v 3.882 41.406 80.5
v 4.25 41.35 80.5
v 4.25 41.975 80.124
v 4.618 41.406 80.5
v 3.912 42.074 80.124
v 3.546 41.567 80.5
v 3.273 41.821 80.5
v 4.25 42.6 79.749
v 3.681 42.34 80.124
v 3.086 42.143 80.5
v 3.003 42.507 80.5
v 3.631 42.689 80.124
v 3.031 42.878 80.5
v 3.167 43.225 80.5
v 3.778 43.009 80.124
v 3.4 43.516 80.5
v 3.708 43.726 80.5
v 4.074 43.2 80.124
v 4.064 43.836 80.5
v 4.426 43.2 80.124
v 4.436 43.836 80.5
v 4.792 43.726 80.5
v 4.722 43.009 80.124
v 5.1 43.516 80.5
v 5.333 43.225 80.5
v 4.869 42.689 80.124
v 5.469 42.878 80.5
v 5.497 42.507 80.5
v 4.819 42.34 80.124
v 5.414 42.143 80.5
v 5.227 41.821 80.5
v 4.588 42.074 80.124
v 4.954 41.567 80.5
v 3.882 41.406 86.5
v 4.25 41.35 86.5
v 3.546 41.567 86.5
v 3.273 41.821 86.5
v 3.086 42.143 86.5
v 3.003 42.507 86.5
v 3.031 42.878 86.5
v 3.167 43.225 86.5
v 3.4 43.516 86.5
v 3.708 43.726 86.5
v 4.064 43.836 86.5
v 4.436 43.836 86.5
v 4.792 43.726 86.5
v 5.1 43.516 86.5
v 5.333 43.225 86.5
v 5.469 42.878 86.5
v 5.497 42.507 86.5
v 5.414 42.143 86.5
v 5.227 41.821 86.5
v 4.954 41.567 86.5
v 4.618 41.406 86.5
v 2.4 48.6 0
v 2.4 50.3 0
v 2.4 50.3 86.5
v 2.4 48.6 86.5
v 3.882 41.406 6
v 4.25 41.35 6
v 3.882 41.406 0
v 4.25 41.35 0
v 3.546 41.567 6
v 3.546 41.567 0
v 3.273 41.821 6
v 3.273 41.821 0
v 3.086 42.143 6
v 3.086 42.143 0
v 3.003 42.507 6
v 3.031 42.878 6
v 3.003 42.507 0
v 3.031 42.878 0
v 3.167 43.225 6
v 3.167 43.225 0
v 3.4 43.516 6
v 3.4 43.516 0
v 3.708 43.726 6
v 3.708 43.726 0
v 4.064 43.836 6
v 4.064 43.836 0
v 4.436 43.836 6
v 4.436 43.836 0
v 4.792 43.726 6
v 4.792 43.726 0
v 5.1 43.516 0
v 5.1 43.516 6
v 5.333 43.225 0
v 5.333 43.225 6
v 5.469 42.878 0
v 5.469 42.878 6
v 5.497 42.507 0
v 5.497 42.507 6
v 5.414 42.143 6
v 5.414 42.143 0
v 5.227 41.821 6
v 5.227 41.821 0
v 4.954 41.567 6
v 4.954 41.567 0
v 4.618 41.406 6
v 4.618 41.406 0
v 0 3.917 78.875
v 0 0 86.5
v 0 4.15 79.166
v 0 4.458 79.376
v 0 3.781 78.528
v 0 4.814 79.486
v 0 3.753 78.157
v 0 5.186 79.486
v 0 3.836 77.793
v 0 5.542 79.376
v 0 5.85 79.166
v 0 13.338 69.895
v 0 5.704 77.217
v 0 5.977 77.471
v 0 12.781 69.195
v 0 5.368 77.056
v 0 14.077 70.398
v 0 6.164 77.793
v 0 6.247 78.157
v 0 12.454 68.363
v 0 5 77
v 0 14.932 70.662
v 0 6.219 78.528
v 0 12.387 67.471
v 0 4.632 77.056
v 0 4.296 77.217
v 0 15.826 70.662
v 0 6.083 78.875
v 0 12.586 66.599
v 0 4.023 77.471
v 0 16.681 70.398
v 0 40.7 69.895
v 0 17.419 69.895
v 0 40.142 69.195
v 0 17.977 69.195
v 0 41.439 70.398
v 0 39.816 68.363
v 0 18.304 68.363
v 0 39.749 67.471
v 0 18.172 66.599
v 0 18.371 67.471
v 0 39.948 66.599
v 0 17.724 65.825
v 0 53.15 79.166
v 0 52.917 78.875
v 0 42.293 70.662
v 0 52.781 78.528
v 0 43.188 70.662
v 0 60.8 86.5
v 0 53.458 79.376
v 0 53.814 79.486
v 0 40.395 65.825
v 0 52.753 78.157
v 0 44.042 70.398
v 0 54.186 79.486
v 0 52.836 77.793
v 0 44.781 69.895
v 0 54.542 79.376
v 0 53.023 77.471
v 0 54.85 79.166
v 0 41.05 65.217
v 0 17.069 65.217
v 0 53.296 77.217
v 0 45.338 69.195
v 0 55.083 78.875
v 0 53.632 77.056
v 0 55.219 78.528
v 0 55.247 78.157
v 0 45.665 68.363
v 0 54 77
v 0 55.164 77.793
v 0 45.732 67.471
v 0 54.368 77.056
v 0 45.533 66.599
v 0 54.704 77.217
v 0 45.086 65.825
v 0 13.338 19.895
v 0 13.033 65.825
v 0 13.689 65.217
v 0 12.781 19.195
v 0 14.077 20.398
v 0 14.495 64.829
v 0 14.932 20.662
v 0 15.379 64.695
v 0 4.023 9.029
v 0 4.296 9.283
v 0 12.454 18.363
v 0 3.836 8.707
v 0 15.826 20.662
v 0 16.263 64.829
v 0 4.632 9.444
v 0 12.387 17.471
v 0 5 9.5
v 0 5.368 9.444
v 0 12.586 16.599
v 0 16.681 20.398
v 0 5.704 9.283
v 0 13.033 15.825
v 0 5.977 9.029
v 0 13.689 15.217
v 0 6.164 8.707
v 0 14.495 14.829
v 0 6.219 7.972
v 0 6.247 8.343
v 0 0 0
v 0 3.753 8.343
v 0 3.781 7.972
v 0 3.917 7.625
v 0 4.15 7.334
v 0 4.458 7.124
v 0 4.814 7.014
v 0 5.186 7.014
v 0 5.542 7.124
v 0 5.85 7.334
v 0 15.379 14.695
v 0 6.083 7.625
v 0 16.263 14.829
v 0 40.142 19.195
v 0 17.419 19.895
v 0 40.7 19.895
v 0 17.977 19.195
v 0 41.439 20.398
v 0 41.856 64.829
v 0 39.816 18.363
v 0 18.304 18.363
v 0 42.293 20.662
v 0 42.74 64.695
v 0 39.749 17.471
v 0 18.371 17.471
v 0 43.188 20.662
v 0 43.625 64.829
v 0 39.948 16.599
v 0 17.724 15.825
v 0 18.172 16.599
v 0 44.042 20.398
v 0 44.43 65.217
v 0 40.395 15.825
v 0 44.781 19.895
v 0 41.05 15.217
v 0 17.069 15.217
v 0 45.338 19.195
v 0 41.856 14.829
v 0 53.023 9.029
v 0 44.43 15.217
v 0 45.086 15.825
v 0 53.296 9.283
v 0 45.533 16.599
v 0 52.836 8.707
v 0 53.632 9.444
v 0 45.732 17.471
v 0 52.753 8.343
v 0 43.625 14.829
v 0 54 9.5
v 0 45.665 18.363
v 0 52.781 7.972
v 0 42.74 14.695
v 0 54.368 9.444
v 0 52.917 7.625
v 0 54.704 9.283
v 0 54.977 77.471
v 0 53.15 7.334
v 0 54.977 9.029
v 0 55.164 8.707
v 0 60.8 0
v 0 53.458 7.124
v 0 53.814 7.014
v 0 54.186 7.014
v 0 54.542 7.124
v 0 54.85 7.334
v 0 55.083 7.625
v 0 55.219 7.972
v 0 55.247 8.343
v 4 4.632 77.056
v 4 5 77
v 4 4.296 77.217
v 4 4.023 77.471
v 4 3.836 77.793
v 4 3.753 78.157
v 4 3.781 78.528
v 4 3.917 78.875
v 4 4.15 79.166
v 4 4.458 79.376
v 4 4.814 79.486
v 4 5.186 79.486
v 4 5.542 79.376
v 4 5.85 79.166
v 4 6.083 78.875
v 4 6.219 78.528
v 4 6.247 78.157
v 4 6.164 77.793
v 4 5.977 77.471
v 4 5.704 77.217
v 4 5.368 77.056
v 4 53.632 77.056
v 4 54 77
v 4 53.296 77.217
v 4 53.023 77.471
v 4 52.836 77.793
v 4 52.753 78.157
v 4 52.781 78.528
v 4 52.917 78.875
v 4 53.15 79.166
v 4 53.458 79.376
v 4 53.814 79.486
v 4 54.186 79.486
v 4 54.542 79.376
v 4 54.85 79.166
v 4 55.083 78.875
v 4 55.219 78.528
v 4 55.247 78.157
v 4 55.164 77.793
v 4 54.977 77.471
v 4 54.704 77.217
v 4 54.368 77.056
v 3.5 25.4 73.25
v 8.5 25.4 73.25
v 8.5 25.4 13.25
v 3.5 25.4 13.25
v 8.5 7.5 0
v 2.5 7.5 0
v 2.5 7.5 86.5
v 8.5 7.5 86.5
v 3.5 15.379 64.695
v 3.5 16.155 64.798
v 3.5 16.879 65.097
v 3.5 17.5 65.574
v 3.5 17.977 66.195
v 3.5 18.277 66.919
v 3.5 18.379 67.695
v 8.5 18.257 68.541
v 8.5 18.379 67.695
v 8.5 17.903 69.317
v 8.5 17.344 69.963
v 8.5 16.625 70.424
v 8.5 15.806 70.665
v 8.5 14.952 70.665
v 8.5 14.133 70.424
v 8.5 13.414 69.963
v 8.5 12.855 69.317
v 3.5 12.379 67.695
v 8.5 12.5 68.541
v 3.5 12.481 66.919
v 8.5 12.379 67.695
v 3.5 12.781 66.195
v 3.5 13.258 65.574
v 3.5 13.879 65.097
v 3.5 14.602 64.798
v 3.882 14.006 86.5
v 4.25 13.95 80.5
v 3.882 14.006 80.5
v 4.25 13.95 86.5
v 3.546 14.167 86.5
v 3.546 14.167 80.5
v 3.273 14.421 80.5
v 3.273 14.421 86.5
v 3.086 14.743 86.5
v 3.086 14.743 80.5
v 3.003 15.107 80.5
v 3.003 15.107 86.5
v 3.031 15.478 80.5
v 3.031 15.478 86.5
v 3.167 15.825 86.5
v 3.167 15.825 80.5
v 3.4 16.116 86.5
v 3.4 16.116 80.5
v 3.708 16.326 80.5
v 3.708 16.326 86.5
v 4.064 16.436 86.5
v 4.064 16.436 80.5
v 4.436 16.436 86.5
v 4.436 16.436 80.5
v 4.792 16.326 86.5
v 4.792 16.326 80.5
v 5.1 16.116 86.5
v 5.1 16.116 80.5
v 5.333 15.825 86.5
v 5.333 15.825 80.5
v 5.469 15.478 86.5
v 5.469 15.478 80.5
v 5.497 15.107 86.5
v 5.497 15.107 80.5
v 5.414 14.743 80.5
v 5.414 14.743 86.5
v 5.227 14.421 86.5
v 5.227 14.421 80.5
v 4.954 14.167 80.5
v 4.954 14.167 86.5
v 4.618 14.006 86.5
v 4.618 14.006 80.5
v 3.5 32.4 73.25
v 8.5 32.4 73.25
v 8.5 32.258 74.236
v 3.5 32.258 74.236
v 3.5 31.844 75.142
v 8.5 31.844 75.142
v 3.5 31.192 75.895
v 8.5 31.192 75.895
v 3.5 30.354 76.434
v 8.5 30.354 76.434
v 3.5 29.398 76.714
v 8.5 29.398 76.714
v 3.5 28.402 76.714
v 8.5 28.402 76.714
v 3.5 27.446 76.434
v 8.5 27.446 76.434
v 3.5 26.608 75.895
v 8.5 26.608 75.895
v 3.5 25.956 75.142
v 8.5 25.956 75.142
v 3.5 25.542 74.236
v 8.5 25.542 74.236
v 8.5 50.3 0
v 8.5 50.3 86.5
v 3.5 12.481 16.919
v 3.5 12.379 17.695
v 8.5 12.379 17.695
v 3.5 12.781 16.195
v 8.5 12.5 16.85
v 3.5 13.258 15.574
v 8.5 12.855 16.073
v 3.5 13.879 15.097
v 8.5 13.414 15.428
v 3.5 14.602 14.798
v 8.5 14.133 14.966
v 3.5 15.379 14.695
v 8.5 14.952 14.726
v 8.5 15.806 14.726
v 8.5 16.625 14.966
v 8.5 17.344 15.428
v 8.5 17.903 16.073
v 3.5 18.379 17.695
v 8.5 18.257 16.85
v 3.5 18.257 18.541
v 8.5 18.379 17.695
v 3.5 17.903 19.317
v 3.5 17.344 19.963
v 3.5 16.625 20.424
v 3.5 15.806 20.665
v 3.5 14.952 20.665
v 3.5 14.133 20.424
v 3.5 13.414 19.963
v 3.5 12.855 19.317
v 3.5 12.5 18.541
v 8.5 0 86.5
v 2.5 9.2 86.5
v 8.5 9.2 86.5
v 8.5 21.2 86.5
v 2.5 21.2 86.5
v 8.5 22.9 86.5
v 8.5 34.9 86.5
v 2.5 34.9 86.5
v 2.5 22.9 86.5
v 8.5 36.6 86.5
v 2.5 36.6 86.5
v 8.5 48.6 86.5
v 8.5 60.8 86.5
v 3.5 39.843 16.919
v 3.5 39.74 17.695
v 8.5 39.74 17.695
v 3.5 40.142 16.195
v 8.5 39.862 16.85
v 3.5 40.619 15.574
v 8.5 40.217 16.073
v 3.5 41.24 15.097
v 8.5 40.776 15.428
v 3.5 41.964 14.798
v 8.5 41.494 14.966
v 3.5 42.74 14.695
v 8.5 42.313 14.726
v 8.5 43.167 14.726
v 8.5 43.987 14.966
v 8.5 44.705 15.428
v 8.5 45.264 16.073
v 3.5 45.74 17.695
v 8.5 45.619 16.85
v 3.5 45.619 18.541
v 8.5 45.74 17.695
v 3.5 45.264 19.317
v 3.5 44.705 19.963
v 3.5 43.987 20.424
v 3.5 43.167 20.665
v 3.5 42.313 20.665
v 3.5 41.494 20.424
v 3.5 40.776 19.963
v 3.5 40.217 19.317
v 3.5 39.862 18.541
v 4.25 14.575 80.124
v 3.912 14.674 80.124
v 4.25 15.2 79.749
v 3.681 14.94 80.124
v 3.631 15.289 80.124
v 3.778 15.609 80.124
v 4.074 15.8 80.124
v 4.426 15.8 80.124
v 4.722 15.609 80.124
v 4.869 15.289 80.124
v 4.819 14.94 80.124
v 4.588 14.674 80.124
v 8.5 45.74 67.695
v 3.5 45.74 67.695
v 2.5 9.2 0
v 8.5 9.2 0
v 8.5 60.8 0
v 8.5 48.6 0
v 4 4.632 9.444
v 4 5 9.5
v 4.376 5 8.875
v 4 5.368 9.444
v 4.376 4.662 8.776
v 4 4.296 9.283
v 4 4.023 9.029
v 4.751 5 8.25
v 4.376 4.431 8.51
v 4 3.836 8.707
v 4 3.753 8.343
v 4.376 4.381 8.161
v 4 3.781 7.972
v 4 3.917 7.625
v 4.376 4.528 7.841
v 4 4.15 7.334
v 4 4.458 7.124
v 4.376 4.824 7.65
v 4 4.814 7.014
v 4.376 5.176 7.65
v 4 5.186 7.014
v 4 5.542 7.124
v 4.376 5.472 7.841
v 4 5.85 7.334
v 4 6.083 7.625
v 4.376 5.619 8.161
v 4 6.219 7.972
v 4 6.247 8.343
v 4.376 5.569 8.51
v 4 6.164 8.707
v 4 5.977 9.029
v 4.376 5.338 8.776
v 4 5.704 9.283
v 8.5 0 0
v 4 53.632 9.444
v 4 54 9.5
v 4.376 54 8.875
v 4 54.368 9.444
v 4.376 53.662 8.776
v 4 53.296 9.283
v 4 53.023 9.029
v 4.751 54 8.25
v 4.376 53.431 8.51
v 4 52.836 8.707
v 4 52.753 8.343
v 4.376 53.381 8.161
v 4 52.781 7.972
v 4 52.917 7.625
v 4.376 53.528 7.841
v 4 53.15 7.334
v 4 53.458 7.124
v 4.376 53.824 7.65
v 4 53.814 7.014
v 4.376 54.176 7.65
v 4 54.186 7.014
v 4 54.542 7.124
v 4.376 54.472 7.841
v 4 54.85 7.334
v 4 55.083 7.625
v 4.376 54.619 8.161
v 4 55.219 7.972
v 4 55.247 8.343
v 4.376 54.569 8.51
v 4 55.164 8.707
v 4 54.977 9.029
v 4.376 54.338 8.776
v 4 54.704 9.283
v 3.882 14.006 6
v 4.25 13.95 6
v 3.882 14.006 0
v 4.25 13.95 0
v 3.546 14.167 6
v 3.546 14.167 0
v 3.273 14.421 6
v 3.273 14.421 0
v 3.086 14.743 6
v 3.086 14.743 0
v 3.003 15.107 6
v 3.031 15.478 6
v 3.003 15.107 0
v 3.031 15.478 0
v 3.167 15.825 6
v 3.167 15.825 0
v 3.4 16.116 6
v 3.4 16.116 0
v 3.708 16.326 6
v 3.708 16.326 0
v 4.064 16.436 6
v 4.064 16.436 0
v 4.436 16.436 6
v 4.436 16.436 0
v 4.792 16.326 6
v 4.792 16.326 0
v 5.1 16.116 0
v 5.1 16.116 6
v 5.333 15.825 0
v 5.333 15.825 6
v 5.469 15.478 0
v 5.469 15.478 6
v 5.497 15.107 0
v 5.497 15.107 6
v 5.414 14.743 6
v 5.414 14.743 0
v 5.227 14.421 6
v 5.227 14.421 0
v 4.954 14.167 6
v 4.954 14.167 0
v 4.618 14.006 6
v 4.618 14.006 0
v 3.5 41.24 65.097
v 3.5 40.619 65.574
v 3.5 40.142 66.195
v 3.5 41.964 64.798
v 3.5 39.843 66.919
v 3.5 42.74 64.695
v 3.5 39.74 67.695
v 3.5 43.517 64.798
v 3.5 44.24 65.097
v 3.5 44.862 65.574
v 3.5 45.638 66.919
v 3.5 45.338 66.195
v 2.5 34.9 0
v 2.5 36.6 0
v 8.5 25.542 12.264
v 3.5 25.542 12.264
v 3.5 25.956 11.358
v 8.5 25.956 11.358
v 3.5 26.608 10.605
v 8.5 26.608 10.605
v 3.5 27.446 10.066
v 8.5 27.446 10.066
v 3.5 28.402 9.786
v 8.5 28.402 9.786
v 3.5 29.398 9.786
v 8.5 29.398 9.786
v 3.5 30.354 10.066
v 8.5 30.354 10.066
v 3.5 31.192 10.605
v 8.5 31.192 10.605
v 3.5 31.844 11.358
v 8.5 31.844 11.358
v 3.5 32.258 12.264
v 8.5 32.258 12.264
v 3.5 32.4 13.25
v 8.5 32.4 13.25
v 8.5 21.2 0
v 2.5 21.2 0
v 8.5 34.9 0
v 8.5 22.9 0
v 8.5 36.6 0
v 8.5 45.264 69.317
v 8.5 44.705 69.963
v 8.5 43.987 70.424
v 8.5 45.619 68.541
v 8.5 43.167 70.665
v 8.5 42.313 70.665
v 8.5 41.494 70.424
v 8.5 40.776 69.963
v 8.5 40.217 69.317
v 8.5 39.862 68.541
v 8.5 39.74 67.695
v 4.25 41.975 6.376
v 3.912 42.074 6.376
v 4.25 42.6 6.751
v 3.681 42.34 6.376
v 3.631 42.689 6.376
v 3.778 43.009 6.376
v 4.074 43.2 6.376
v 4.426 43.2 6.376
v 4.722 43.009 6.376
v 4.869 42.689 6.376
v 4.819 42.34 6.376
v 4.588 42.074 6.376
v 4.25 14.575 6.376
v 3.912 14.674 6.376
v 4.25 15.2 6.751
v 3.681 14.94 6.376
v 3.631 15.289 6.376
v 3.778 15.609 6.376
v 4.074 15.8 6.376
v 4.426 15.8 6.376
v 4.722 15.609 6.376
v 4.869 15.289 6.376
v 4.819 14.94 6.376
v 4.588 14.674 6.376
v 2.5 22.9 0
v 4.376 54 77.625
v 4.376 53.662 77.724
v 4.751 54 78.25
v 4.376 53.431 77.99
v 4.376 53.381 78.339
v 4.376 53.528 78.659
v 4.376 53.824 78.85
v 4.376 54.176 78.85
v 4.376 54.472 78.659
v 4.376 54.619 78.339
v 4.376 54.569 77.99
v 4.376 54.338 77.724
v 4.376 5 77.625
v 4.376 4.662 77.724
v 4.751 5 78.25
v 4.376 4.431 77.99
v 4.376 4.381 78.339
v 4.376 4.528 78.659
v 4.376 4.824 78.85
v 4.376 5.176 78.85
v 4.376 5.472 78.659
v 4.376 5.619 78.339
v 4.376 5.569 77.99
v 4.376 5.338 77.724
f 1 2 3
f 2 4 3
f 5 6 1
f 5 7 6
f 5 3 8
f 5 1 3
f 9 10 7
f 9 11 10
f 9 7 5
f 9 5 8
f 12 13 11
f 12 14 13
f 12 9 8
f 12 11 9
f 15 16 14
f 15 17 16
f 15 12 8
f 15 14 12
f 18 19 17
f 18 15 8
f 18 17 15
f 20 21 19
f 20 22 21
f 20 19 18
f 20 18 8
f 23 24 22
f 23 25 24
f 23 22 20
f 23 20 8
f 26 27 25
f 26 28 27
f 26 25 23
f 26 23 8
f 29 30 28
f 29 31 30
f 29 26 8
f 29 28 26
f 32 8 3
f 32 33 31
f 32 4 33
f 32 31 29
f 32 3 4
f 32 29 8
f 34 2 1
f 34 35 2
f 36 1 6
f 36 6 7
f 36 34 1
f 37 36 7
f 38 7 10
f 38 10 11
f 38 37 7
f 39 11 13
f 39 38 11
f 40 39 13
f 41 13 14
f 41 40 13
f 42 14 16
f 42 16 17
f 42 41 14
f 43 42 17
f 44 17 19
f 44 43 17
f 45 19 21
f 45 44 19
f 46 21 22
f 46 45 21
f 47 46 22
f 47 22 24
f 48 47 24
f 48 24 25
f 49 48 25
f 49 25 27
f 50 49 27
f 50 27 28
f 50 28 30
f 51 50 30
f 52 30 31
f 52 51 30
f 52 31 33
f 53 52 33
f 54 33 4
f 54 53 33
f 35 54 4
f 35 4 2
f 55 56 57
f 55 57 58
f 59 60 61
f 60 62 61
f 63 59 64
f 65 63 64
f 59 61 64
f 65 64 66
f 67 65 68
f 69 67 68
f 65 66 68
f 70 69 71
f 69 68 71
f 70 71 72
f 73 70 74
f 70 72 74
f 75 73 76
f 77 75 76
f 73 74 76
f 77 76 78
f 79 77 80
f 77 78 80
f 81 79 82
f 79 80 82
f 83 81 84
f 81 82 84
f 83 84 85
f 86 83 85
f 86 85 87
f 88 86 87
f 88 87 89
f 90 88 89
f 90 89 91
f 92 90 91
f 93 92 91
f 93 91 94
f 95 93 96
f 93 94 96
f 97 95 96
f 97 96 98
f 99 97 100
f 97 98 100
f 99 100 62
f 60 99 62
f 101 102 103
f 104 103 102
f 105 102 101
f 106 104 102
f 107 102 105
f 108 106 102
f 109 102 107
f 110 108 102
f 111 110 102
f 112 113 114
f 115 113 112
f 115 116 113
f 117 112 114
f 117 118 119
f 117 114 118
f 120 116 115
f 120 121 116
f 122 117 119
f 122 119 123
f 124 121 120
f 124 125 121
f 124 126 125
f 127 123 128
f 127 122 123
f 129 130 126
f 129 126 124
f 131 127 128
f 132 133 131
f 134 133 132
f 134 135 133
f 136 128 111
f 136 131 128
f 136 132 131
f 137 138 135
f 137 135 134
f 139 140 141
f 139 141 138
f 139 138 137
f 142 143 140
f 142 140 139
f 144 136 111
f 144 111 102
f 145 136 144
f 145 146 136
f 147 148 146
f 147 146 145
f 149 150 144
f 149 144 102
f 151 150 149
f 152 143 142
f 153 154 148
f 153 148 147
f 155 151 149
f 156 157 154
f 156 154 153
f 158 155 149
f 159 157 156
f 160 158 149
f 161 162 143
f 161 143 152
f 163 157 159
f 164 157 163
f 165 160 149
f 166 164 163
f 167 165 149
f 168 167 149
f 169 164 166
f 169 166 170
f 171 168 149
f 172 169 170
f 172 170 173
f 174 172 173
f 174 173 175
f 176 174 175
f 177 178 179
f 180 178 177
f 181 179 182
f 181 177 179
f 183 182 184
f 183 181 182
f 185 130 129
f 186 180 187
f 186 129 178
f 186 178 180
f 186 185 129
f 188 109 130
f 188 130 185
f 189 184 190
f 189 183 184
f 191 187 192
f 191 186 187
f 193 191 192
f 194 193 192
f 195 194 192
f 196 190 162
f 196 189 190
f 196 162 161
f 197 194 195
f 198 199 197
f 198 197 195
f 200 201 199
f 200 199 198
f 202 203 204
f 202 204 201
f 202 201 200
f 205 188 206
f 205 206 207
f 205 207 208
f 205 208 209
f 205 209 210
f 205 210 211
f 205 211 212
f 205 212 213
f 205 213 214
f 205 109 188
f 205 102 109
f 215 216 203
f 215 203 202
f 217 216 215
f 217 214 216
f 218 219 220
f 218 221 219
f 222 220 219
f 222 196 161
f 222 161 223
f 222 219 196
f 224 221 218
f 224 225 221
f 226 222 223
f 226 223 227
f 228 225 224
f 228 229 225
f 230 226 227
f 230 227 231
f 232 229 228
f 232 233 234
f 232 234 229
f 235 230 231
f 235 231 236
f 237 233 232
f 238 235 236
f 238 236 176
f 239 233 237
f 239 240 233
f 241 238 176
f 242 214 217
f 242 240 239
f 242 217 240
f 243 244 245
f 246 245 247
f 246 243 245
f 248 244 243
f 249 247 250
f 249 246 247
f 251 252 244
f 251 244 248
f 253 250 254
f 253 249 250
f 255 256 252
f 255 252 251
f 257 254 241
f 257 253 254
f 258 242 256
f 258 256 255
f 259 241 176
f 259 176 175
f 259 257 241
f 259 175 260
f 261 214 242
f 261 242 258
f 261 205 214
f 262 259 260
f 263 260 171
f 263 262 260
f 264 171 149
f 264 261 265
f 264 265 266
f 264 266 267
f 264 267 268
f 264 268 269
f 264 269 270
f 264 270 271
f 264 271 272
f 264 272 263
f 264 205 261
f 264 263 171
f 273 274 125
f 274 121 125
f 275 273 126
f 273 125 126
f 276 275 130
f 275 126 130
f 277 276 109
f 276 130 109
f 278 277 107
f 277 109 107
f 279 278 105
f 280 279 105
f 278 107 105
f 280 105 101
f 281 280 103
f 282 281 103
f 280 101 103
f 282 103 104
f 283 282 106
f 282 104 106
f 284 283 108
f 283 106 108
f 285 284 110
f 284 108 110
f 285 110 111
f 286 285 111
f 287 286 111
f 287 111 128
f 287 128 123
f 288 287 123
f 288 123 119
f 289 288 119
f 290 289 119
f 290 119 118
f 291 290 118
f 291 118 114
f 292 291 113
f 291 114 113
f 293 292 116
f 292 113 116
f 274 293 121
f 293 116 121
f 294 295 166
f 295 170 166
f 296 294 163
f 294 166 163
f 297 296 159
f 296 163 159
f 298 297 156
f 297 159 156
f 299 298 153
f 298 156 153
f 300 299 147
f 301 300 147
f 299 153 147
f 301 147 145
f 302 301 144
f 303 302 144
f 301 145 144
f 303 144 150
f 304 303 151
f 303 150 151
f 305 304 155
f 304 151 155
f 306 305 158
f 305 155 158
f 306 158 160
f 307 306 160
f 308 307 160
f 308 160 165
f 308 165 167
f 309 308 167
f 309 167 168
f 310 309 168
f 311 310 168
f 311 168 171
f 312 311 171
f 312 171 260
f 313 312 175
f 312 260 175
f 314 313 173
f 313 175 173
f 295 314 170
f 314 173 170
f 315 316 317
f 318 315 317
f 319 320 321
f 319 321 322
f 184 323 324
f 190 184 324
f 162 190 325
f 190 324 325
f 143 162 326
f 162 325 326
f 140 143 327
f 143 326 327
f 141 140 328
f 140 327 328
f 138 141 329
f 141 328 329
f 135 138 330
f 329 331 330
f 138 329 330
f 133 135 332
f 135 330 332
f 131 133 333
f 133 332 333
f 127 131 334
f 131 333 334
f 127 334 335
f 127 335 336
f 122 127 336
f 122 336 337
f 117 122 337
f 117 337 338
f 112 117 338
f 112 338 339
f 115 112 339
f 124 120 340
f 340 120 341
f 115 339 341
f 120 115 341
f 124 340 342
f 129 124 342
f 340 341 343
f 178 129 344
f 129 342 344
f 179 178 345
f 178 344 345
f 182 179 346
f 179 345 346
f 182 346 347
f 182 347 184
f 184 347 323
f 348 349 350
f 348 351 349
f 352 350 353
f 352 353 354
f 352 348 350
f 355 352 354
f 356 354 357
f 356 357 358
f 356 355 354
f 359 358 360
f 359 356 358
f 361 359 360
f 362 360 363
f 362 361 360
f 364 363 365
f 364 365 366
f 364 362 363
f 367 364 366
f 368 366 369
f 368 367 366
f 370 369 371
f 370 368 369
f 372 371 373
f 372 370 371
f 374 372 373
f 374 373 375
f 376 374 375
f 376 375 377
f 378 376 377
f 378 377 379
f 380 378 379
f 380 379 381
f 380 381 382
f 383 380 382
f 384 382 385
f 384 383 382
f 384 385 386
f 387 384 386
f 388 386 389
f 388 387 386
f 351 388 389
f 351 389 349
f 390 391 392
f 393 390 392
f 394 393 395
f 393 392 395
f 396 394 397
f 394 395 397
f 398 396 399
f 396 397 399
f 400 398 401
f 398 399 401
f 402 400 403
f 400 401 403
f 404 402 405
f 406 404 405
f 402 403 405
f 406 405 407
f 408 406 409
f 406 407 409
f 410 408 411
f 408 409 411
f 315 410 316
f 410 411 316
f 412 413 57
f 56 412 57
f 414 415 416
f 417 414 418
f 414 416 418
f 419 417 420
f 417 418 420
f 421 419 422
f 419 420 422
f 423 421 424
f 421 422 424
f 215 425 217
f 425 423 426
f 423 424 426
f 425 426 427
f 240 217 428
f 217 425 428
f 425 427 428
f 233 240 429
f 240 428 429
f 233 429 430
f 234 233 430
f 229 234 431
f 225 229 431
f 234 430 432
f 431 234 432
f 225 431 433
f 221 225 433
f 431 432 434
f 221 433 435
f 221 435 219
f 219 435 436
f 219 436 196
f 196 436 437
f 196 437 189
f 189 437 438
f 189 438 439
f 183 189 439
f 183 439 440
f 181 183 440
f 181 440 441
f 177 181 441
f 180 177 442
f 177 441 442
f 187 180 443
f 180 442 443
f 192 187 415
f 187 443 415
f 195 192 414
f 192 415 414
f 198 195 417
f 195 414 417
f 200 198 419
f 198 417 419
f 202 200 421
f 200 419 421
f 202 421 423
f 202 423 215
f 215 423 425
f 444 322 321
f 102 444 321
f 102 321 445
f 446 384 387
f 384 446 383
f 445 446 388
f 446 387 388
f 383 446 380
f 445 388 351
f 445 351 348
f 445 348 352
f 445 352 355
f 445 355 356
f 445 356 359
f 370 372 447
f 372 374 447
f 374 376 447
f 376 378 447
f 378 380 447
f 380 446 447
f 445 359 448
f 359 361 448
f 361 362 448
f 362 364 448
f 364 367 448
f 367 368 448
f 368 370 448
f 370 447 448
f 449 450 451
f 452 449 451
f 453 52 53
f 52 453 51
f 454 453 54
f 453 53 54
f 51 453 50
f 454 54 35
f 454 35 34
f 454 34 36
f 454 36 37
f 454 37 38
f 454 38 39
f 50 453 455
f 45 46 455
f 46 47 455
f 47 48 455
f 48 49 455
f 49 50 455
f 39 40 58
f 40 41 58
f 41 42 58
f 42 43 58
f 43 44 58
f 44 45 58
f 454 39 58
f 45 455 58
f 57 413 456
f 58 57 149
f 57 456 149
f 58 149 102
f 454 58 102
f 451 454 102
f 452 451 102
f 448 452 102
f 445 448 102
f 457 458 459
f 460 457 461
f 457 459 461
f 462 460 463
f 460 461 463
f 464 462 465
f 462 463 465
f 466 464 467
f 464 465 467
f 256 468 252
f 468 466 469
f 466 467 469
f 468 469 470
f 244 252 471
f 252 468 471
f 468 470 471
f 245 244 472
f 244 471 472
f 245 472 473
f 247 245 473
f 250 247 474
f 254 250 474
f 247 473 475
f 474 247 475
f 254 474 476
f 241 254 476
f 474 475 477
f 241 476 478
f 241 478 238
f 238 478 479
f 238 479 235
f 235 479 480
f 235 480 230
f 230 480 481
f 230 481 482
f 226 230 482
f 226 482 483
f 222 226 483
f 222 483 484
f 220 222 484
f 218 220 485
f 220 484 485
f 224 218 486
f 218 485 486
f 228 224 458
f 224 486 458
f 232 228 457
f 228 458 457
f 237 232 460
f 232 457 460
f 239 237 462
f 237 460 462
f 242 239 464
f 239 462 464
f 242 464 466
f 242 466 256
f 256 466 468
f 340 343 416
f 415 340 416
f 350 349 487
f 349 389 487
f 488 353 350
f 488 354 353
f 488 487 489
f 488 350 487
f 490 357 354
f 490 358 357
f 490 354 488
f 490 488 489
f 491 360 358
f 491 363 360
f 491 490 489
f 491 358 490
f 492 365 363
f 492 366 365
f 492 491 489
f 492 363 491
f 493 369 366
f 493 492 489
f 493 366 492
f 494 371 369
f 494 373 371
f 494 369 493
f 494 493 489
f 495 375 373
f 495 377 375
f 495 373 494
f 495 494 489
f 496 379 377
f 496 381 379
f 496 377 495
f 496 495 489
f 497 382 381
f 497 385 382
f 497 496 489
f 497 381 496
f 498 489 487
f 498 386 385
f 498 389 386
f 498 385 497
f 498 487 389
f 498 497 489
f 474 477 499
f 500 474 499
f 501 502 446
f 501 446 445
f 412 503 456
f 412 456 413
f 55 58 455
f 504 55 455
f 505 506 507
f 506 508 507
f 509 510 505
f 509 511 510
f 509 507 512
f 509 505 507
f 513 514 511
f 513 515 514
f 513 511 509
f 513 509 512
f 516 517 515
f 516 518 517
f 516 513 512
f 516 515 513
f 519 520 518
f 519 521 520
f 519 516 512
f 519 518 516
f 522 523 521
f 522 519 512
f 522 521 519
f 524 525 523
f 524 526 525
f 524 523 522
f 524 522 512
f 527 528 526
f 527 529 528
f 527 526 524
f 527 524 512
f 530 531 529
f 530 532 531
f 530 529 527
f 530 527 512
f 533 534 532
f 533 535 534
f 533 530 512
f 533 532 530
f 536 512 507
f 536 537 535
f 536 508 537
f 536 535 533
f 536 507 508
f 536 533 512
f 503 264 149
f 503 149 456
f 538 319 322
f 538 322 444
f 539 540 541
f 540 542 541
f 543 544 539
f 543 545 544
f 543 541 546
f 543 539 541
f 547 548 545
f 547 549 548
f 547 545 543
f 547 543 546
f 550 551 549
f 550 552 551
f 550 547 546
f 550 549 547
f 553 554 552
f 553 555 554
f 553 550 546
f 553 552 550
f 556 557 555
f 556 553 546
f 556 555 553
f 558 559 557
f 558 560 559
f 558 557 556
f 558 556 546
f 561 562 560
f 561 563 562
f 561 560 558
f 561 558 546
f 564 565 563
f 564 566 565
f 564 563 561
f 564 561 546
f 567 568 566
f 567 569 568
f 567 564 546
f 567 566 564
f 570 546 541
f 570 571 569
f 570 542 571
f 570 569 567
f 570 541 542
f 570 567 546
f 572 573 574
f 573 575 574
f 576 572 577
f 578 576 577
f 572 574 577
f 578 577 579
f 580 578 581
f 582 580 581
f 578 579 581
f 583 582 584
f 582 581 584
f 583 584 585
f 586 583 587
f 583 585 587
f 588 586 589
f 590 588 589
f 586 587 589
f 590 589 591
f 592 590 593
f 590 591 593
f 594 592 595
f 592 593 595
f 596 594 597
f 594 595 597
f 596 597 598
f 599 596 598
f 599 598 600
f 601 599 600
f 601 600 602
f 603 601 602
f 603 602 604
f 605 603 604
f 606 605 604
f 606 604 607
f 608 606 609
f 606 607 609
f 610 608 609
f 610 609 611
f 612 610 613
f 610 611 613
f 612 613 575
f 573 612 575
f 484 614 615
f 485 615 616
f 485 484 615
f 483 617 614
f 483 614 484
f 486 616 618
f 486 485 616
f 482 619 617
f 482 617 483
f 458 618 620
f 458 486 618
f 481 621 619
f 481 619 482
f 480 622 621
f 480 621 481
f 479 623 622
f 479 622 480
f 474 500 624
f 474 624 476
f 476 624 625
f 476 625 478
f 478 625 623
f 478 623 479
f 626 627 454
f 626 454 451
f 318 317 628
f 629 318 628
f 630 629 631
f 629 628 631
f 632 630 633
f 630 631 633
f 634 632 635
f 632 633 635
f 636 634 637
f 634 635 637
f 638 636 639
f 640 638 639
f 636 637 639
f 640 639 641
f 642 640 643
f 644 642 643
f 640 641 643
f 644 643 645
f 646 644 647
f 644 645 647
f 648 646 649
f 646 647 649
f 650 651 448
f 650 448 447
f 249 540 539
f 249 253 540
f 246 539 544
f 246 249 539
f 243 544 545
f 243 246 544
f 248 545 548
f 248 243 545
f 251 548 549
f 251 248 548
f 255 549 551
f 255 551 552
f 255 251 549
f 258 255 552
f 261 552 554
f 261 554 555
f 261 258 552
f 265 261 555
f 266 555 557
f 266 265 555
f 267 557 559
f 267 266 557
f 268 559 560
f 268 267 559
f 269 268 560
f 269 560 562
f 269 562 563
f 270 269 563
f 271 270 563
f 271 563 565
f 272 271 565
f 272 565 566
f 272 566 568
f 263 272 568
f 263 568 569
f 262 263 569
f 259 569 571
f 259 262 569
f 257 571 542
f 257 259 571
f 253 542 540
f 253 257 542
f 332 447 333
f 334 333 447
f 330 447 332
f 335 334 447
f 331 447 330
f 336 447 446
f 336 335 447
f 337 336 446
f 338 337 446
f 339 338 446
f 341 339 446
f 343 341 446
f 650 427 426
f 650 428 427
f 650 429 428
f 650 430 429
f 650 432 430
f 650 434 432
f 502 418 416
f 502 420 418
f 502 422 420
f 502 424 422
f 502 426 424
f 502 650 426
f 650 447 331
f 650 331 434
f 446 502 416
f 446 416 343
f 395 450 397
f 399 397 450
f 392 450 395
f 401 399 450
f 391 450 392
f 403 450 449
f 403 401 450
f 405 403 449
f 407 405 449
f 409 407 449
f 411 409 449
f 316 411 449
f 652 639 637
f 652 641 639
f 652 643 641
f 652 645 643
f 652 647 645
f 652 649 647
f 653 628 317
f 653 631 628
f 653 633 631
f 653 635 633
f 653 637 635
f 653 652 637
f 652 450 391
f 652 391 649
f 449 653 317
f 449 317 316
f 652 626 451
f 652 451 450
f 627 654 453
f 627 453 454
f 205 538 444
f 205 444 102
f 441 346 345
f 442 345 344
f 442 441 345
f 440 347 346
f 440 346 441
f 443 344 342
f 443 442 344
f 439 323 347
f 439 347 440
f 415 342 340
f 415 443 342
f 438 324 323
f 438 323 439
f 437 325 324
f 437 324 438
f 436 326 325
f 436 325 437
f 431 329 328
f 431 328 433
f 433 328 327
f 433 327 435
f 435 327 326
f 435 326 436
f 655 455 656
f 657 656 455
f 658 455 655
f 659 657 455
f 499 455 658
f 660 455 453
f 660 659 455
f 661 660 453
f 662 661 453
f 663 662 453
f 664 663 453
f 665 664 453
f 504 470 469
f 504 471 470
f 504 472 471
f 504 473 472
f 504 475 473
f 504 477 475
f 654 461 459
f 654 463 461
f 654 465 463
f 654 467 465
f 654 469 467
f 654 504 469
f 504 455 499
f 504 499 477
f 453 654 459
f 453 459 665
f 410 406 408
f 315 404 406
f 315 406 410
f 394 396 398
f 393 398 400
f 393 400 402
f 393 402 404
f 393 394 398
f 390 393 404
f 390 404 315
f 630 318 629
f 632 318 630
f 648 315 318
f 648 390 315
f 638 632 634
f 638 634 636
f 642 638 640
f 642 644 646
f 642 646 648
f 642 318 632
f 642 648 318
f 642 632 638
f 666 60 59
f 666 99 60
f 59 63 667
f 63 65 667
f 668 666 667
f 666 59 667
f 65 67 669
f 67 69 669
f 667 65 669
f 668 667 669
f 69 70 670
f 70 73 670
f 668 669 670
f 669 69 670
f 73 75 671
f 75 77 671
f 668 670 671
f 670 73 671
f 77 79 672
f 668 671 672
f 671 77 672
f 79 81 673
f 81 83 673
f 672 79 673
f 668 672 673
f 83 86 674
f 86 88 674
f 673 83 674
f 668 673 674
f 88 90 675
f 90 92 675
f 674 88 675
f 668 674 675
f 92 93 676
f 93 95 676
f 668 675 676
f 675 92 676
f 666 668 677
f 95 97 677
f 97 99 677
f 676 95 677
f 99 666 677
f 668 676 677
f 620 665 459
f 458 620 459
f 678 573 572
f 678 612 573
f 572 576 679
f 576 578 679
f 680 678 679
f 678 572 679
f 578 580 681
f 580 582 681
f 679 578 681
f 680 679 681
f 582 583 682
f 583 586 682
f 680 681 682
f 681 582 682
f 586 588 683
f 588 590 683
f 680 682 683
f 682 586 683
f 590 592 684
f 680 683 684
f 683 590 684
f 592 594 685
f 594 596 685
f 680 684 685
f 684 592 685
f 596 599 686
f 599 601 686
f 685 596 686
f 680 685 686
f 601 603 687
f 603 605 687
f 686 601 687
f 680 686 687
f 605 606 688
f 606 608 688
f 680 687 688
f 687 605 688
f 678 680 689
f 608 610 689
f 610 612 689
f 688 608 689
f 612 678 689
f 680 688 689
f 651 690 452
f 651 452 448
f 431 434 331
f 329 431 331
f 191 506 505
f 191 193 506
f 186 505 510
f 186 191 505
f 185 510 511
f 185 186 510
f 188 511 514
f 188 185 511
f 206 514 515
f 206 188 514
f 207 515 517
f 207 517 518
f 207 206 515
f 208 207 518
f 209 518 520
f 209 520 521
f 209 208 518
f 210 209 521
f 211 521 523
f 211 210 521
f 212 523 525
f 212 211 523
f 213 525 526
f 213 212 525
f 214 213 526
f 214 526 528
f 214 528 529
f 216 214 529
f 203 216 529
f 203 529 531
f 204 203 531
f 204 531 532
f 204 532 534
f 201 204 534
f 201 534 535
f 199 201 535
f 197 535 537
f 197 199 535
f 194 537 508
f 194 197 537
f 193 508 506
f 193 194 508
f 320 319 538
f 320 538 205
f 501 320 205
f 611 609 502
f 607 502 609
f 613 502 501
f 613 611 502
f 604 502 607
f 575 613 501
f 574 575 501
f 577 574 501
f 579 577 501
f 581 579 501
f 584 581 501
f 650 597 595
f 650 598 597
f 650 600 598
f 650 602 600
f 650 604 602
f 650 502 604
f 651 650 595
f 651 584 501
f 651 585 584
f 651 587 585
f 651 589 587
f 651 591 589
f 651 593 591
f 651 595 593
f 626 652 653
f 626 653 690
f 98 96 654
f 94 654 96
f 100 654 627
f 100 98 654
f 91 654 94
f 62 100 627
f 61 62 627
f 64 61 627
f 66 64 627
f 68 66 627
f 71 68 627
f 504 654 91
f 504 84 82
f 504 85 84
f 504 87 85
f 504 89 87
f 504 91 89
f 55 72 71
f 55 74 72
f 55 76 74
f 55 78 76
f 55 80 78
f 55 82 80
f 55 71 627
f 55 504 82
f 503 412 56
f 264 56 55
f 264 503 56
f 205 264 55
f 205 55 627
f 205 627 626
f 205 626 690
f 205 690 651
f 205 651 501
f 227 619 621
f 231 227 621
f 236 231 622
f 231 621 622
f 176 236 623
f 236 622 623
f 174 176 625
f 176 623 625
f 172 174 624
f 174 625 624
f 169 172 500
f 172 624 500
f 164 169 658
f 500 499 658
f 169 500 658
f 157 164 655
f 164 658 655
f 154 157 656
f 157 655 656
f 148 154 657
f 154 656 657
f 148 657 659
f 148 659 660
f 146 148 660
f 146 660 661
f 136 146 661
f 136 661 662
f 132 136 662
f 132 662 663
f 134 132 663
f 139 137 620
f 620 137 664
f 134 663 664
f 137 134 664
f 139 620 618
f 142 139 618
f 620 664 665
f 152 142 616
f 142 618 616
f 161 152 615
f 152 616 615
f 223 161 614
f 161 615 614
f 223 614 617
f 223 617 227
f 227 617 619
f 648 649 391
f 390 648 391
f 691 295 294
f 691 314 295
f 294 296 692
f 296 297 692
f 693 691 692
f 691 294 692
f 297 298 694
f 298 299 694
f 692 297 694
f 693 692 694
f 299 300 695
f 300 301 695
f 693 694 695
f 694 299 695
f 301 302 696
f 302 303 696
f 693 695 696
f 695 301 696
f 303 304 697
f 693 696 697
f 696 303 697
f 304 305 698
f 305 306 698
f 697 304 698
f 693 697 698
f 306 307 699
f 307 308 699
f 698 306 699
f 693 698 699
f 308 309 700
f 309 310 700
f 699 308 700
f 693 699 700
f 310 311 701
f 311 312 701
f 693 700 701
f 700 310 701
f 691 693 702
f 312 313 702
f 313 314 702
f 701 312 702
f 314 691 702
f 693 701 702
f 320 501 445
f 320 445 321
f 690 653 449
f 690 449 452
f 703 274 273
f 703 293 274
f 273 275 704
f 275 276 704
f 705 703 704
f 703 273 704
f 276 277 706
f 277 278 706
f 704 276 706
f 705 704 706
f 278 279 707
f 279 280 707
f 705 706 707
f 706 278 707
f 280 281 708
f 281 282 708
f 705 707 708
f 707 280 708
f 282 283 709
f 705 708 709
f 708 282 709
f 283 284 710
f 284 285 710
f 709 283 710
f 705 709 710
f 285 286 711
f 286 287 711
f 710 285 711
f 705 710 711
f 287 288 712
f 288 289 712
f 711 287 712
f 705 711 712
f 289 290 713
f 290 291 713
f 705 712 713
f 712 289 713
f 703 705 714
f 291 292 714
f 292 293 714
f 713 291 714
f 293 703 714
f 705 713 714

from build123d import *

# Parameters (mm, degrees)
BOSS_EXTRUDE1_DEPTH            = 86.5
M3X0_5_TAPPED_HOLE2_AT_2_COUNT = 2
M3X0_5_TAPPED_HOLE2_AT_2_PITCH = 27.4
M3X0_5_TAPPED_HOLE1_AT_2_COUNT = 2
M3X0_5_TAPPED_HOLE1_AT_2_PITCH = 49
SKETCH14_R                     = 3.5
CUT_EXTRUDE3_DEPTH             = 5
CUT_EXTRUDE1_DEPTH             = 5
SKETCH13_R                     = 3
CUT_EXTRUDE2_DEPTH             = 4.5


with BuildPart() as part:
    # Sketch1 → Boss-Extrude1 (new body)
    with BuildSketch(Plane.XY):
        Polygon((0, 0), (0, 60.8), (8.5, 60.8), (8.5, 50.3), (2.4, 50.3), (2.4, 48.6), (8.5, 48.6), (8.5, 36.6), (2.5, 36.6), (2.5, 34.9), (8.5, 34.9), (8.5, 22.9), (2.5, 22.9), (2.5, 21.2), (8.5, 21.2), (8.5, 9.2), (2.5, 9.2), (2.5, 7.5), (8.5, 7.5), (8.5, 0), align=None)
    extrude(amount=BOSS_EXTRUDE1_DEPTH)

    # Sketch4 → M3x0.5 Tapped Hole2 (revolve, cut)
    with BuildSketch(Plane(origin=(4.25, 42.6, 86.5), x_dir=(0, -1, 0), z_dir=(1, 0, 0))):
        Polygon((0, 0), (0, 6.751075774), (1.25, 6), (1.25, 0), align=None)
    m3x0_5_tapped_hole2 = revolve(axis=Axis((4.25, 42.6, 92.85), (0, 0, -1)), mode=Mode.SUBTRACT)

    # M3x0.5 Tapped Hole2 at 2: M3x0.5 Tapped Hole2 ×2
    with Locations(*[(0, -i * M3X0_5_TAPPED_HOLE2_AT_2_PITCH, 0) for i in range(1, M3X0_5_TAPPED_HOLE2_AT_2_COUNT)]):
        add(m3x0_5_tapped_hole2, mode=Mode.SUBTRACT)

    # Mirror1: M3x0.5 Tapped Hole2 across plane
    add(m3x0_5_tapped_hole2.mirror(Plane.XY.offset(43.25)), mode=Mode.SUBTRACT)

    # Mirror1 copy 1 sketch → Mirror1 copy 1 (revolve, cut)
    with BuildSketch(Plane(origin=(4.25, 15.2, 0), x_dir=(0, -1, 0), z_dir=(1, 0, 0))):
        Polygon((0, 0), (0, -6.751075774), (1.25, -6), (1.25, 0), align=None)
    revolve(axis=Axis((4.25, 15.2, -6.35), (0, 0, -1)), mode=Mode.SUBTRACT)

    # Sketch11 → M3x0.5 Tapped Hole1 (revolve, cut)
    with BuildSketch(Plane(origin=(0, 5, 8.25), x_dir=(0, 0, 1), z_dir=(0, 1, 0))):
        Polygon((0, 0), (0, 4.751075774), (1.25, 4), (1.25, 0), align=None)
    m3x0_5_tapped_hole1 = revolve(axis=Axis((-6.35, 5, 8.25), (1, 0, 0)), mode=Mode.SUBTRACT)

    # M3x0.5 Tapped Hole1 at 2: M3x0.5 Tapped Hole1 ×2
    with Locations(*[(0, i * M3X0_5_TAPPED_HOLE1_AT_2_PITCH, 0) for i in range(1, M3X0_5_TAPPED_HOLE1_AT_2_COUNT)]):
        add(m3x0_5_tapped_hole1, mode=Mode.SUBTRACT)

    # Mirror2: M3x0.5 Tapped Hole1 across plane
    add(m3x0_5_tapped_hole1.mirror(Plane(origin=(0, 0, 43.25), x_dir=(1, 0, 0), z_dir=(0, 0, -1))), mode=Mode.SUBTRACT)

    # Mirror2 copy 1 sketch → Mirror2 copy 1 (revolve, cut)
    with BuildSketch(Plane(origin=(0, 54, 78.25), x_dir=(0, 0, -1), z_dir=(0, 1, 0))):
        Polygon((0, 0), (0, -4.751075774), (1.25, -4), (1.25, 0), align=None)
    revolve(axis=Axis((-6.35, 54, 78.25), (-1, 0, 0)), mode=Mode.SUBTRACT)

    # Sketch14 → Cut-Extrude3 (cut)
    with BuildSketch(Plane(origin=(8.5, 0, 0), x_dir=(0, 0, -1), z_dir=(1, 0, 0))):
        with BuildLine():
            Line((-13.25, 32.4), (-73.25, 32.4))
            ThreePointArc((-73.25, 32.4), (-70.775126266, 31.374873734), (-69.75, 28.9))
            ThreePointArc((-69.75, 28.9), (-70.775126266, 26.425126266), (-73.25, 25.4))
            Line((-73.25, 25.4), (-13.25, 25.4))
            ThreePointArc((-13.25, 25.4), (-16.75, 28.9), (-13.25, 32.4))
        make_face()
        with Locations((-73.25, 28.9)):
            Circle(SKETCH14_R)
        with Locations((-13.25, 28.9)):
            Circle(SKETCH14_R)
    extrude(amount=-CUT_EXTRUDE3_DEPTH, mode=Mode.SUBTRACT)

    # Sketch12 → Cut-Extrude1 (cut)
    with BuildSketch(Plane(origin=(8.5, 0, 0), x_dir=(0, 0, -1), z_dir=(1, 0, 0))):
        with BuildLine():
            Line((-17.695375576, 45.740393433), (-67.695375576, 45.740393433))
            ThreePointArc((-67.695375576, 45.740393433), (-70.695375576, 42.740393433), (-67.695375576, 39.740393433))
            Line((-67.695375576, 39.740393433), (-17.695375576, 39.740393433))
            ThreePointArc((-17.695375576, 39.740393433), (-14.695375576, 42.740393433), (-17.695375576, 45.740393433))
        make_face()
        with BuildLine():
            Line((-17.695375576, 18.378921852), (-67.695375576, 18.378921852))
            ThreePointArc((-67.695375576, 18.378921852), (-70.695375576, 15.378921852), (-67.695375576, 12.378921852))
            Line((-67.695375576, 12.378921852), (-17.695375576, 12.378921852))
            ThreePointArc((-17.695375576, 12.378921852), (-14.695375576, 15.378921852), (-17.695375576, 18.378921852))
        make_face()
    extrude(amount=-CUT_EXTRUDE1_DEPTH, mode=Mode.SUBTRACT)

    # Sketch13 → Cut-Extrude2 (cut, through all)
    with BuildSketch(Plane(origin=(3.5, 0, 0), x_dir=(0, 0, -1), z_dir=(1, 0, 0))):
        with Locations((-67.695375576, 42.740393433)):
            Circle(SKETCH13_R)
        with Locations((-17.695375576, 42.740393433)):
            Circle(SKETCH13_R)
        with Locations((-17.695375576, 15.378921852)):
            Circle(SKETCH13_R)
        with Locations((-67.695375576, 15.378921852)):
            Circle(SKETCH13_R)
    extrude(amount=-CUT_EXTRUDE2_DEPTH, mode=Mode.SUBTRACT)


solid = part.part
